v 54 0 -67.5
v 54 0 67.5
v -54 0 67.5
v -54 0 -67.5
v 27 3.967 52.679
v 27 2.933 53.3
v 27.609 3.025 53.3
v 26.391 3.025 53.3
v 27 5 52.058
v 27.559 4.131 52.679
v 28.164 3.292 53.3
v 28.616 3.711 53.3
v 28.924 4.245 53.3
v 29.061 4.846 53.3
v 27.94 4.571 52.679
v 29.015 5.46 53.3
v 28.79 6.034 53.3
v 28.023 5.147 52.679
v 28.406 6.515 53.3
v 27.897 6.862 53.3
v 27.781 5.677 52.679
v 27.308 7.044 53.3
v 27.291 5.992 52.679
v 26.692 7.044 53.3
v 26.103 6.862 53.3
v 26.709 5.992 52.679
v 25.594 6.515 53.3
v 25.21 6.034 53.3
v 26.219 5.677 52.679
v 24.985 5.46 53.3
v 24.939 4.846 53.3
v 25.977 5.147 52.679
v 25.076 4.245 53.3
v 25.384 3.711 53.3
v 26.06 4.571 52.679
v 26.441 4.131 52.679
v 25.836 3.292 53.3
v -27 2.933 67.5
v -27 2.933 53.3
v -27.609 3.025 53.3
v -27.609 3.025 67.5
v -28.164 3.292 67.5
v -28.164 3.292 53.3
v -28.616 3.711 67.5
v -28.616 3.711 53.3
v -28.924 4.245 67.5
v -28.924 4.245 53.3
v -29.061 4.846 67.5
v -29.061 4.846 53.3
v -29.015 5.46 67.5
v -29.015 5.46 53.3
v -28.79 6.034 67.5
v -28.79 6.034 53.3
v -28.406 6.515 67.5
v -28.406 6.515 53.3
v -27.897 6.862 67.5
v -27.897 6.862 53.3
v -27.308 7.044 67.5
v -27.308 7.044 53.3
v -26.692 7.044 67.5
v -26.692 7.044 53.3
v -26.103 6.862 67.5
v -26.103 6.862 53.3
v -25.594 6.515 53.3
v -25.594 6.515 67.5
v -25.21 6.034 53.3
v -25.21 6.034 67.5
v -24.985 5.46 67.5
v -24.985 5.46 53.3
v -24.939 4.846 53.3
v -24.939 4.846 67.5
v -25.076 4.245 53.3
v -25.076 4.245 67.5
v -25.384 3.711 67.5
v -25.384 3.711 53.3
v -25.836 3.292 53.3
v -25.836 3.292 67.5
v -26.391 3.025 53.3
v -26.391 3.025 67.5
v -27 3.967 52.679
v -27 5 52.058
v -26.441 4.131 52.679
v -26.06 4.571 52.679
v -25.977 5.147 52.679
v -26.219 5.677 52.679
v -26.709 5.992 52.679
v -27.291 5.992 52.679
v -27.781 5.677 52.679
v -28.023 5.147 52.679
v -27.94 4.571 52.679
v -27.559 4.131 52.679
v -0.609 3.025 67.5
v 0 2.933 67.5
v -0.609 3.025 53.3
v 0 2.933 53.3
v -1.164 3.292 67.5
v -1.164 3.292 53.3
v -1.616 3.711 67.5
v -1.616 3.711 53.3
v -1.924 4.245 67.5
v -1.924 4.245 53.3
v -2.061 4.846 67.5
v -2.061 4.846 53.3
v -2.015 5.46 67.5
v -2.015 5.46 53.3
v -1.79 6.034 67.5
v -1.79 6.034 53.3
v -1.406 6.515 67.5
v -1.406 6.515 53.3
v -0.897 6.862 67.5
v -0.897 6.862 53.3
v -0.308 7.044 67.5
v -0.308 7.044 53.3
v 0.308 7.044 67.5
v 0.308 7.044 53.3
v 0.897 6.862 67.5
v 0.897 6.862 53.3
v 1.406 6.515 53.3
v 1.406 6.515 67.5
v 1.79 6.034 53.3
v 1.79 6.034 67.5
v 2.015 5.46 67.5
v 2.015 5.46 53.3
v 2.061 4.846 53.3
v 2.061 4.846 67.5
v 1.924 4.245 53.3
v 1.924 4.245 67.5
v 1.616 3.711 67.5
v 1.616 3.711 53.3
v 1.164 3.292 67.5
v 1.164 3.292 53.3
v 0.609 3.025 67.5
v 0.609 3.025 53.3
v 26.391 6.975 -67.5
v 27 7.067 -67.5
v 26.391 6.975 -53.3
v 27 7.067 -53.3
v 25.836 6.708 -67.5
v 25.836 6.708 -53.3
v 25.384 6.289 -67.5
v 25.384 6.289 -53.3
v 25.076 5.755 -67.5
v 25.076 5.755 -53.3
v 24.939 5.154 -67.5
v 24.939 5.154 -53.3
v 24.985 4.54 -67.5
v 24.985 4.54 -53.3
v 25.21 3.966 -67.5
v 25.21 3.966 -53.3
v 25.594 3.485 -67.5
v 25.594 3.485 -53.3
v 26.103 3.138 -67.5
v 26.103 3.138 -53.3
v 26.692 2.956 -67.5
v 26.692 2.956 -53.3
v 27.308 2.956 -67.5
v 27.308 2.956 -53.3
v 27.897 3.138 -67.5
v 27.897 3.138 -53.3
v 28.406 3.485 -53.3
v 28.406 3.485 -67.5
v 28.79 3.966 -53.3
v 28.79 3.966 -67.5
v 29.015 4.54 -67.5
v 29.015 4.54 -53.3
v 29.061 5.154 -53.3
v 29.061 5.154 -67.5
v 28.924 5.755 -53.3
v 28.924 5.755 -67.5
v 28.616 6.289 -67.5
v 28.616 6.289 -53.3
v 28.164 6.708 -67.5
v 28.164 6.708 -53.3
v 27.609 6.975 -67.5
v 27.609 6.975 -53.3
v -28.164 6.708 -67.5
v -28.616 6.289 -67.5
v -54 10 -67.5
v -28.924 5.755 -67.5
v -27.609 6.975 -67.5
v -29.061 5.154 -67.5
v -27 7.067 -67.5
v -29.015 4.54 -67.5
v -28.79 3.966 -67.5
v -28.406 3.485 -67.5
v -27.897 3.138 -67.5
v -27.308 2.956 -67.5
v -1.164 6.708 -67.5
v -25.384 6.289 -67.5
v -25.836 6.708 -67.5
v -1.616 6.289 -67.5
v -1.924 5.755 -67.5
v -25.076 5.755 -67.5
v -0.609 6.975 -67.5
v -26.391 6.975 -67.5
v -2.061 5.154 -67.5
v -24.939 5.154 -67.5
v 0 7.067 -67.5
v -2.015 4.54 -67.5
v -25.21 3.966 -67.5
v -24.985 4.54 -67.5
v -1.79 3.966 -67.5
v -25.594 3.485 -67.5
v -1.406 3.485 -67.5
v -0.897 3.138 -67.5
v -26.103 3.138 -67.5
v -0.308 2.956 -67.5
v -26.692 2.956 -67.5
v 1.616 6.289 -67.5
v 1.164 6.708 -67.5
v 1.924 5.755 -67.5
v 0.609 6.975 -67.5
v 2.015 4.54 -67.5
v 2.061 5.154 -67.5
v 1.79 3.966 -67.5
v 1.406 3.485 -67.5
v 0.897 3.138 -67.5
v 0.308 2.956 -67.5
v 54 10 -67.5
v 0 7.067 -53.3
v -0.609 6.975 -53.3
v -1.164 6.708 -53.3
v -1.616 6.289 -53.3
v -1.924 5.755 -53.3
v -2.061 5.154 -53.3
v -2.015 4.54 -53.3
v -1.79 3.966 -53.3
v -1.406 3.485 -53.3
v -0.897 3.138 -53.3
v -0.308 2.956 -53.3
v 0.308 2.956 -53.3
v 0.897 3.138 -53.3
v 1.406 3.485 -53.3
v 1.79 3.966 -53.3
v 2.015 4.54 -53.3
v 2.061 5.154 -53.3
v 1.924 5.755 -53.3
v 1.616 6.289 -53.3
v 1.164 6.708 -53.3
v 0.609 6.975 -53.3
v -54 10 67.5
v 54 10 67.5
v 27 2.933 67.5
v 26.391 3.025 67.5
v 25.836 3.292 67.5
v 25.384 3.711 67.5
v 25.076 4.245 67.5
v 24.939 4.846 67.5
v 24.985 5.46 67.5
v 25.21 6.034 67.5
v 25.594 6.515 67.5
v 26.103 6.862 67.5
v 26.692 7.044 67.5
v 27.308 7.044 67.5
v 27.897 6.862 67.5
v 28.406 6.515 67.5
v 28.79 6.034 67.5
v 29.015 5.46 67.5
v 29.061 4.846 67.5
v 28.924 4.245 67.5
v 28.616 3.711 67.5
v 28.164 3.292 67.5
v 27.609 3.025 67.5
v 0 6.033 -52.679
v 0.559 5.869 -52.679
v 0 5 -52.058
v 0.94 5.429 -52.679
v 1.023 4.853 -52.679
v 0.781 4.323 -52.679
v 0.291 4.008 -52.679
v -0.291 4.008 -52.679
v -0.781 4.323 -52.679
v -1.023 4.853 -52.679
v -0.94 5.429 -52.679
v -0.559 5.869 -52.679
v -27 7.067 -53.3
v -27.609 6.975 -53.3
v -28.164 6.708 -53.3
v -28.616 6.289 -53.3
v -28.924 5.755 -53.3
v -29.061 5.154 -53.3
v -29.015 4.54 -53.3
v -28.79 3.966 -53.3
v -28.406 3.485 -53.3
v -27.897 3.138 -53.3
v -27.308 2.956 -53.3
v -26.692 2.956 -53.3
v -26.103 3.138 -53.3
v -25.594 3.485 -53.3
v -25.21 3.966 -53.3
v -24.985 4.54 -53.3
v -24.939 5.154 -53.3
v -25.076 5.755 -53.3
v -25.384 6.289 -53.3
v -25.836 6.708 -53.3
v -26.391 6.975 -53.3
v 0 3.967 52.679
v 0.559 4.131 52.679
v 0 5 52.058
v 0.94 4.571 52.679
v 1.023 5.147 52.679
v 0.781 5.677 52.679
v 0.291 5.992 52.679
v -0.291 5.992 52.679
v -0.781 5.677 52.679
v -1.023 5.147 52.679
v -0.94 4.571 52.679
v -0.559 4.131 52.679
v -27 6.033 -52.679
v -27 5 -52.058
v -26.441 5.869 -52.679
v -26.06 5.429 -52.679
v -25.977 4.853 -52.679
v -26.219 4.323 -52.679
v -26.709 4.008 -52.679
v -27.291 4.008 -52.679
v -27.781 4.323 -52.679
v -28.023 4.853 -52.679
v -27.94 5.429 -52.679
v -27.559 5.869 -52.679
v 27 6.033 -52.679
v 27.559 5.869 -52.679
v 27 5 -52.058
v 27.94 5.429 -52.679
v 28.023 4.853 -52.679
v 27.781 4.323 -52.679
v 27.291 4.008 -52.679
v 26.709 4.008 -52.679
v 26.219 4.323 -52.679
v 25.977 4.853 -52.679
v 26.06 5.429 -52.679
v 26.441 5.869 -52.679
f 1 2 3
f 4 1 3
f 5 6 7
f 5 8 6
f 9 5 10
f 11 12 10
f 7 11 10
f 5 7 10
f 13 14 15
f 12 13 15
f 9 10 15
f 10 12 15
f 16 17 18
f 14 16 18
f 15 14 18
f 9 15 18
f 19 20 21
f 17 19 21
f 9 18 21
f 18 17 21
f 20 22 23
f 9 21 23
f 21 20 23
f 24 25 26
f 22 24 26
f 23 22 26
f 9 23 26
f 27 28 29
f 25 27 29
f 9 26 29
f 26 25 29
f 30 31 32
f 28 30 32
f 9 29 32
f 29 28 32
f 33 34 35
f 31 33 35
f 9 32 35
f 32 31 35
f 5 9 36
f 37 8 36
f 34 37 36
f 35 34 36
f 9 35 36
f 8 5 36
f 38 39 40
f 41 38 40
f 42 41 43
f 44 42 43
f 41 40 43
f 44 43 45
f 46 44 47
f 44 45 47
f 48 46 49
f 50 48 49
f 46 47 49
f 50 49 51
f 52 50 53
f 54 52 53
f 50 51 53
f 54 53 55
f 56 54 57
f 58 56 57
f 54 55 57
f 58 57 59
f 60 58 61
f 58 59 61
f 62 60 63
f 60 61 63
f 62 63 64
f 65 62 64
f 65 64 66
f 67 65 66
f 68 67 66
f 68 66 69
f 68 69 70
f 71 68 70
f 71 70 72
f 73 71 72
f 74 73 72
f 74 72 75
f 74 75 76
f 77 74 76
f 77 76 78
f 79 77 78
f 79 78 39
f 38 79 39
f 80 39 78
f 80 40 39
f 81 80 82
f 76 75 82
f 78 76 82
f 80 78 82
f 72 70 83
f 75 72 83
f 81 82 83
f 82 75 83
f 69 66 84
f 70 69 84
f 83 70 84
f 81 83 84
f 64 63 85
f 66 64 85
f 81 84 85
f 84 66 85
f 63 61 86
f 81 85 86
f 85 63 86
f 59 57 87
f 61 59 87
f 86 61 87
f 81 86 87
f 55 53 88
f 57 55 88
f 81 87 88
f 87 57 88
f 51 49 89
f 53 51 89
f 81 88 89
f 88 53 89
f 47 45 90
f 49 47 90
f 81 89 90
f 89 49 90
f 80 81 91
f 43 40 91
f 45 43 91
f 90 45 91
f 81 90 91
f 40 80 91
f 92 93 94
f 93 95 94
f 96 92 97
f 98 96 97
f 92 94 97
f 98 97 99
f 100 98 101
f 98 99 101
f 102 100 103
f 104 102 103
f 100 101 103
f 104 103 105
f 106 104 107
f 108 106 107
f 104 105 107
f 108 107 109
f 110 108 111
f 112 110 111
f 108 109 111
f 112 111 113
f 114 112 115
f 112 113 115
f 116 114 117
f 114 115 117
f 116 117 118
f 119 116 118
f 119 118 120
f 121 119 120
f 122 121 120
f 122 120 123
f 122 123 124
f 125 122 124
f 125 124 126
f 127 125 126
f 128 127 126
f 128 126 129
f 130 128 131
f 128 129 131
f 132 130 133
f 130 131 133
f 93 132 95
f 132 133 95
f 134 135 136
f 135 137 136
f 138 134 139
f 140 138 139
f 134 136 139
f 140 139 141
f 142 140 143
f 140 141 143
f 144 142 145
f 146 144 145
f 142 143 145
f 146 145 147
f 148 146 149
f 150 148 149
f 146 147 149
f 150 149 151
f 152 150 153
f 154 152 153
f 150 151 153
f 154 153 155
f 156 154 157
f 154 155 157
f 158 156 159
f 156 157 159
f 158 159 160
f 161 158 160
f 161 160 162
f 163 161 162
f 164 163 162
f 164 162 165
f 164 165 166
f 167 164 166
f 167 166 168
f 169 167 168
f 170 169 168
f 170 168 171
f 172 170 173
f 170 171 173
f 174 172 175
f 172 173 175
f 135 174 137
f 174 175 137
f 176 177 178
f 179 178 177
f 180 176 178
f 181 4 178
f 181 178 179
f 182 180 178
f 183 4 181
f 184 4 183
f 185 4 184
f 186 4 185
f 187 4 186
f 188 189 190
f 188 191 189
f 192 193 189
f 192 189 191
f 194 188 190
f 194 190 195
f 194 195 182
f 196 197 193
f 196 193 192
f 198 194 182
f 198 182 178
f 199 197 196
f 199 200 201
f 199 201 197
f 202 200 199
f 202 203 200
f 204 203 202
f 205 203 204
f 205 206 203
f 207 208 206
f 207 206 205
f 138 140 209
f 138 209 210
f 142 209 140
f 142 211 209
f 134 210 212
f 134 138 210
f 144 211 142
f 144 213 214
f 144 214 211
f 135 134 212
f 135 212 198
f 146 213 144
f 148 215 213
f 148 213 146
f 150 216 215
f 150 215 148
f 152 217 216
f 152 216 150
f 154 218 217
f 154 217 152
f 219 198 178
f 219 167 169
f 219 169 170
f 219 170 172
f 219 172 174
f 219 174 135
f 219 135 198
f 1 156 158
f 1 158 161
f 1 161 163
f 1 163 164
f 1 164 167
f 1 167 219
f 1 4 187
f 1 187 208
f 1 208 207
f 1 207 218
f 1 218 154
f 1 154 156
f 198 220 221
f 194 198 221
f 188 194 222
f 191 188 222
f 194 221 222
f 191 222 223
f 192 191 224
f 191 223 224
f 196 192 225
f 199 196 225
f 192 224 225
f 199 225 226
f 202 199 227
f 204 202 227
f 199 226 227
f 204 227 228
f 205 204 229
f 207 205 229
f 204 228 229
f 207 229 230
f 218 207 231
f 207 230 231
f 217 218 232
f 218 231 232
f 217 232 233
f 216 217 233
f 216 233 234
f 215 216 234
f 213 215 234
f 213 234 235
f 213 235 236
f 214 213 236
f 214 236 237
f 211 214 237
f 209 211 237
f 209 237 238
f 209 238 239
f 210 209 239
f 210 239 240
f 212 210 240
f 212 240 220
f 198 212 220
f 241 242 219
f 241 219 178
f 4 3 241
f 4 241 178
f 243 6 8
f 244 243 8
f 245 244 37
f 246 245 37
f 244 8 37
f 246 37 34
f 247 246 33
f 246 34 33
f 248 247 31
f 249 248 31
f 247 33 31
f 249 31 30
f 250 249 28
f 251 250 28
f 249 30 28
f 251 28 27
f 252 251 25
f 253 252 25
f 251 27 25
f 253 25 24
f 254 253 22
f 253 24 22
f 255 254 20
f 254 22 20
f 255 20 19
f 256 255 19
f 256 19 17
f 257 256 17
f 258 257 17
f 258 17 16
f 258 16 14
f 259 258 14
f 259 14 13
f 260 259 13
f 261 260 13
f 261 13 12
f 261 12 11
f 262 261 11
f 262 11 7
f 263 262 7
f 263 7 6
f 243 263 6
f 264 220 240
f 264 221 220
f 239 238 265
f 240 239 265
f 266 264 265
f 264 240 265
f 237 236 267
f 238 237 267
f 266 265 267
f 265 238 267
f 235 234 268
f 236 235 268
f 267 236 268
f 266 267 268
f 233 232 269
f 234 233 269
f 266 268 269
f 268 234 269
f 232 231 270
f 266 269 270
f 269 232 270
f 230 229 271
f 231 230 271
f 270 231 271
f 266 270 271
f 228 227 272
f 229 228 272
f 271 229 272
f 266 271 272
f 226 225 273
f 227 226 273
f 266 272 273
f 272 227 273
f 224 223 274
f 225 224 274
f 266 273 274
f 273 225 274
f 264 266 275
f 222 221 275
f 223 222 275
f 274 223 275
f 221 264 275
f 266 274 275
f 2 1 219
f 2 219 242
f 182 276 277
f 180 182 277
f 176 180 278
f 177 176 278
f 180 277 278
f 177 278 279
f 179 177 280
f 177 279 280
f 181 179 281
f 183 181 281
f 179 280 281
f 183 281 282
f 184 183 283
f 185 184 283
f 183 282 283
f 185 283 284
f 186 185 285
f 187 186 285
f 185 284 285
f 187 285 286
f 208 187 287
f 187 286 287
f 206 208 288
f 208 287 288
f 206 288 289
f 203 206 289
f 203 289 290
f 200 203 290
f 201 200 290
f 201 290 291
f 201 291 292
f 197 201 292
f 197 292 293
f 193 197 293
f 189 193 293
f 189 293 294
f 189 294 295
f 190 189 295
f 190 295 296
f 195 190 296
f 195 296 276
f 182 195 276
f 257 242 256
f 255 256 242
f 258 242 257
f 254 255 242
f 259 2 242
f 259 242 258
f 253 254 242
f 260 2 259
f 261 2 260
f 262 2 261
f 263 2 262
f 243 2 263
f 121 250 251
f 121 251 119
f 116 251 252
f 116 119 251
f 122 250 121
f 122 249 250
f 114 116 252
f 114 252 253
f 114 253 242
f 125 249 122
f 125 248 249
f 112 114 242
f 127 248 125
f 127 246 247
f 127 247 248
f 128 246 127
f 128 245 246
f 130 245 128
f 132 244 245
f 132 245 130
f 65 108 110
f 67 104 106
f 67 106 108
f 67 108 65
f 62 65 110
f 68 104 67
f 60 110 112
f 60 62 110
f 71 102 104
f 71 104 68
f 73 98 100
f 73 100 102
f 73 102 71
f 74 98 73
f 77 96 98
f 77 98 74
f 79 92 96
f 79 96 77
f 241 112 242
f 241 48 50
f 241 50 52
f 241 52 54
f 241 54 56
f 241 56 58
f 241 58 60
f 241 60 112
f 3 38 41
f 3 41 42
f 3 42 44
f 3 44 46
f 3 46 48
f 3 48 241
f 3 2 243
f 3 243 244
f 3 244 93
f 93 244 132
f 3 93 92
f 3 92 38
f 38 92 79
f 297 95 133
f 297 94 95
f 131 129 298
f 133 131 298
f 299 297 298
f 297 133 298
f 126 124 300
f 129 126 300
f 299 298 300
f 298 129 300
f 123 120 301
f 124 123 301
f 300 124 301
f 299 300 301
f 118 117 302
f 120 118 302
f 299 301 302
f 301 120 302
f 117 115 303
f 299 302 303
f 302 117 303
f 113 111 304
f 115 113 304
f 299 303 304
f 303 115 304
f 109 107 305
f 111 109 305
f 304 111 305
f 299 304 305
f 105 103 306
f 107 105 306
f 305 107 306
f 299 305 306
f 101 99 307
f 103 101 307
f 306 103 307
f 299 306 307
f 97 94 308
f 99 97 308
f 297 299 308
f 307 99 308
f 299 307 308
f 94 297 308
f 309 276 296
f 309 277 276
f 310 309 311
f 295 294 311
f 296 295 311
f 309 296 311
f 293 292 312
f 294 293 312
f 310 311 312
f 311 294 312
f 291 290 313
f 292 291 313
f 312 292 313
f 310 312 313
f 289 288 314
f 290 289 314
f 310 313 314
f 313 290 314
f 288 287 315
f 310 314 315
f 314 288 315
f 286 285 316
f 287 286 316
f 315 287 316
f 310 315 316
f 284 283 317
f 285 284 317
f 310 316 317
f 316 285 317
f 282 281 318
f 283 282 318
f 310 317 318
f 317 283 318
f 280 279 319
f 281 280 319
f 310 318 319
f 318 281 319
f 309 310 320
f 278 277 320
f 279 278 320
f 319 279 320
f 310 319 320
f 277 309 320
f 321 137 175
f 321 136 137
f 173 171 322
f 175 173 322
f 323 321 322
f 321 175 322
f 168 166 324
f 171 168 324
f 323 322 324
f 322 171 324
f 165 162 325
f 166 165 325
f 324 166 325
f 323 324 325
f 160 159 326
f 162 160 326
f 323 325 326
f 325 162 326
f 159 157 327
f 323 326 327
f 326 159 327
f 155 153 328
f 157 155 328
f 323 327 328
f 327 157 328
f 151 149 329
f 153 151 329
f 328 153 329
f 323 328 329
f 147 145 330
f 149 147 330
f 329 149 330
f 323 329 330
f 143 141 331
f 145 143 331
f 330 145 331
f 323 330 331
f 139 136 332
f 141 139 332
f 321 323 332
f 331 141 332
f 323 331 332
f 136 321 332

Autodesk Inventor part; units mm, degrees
ref_plane "YZ Plane" through (0, 0, 0) normal (1, 0, 0) x (0, 1, 0)
ref_plane "XZ Plane" through (0, 0, 0) normal (0, 1, 0) x (-1, 0, 0)
ref_plane "XY Plane" through (0, 0, 0) normal (0, 0, 1) x (1, 0, 0)
sketch "Sketch1" plane through (0, 0, 0) normal (0, 1, 0) x (-1, 0, 0)
  line L0 (54, -67.5) -> (-54, -67.5)
  line L1 (-54, -67.5) -> (-54, 67.5)
  line L2 (-54, 67.5) -> (54, 67.5)
  line L3 (54, 67.5) -> (54, -67.5)
  line L4 (0, -94.5) -> (0, 94.5) construction
  line L5 (-75.6, 0) -> (75.6, 0) construction
  point P0 (0, 0)
  dimension "d0" = 108
  dimension "d1" = 135
extrude "Extrusion1" add sketch "Sketch1" along normal blind 10
sketch "Sketch2" plane through (-54, 0, 67.5) normal (0, 0, 1) x (1, 0, 0)
  line L0 (108, 10) -> (0, 10) projected
  line L1 (54, 10) -> (54, 0) construction
  line L2 (3.9342, 5) -> (111.9342, 5) construction
  point P0 (54, 5)
  point P1 (81, 5)
  point P2 (27, 5)
  dimension "d4" = 54
hole "Hole1" at (0, 5, 67.5) at (27, 5, 67.5) at (-27, 5, 67.5) direction (0, 0, -1) diameter 4.134 depth 14.2 tip angle 118 thread size "M5x0.8" class "6H" standard "ISO Metric profile"
sketch "Sketch3" plane through (54, 0, -67.5) normal (0, 0, -1) x (-1, 0, 0)
  point P0 (54, 0)
  point P1 (27, 5)
  point P2 (54, 5)
  point P3 (81, 5)
hole "Hole2" at (27, 5, -67.5) at (0, 5, -67.5) at (-27, 5, -67.5) direction (0, 0, 1) diameter 4.134 depth 14.2 tip angle 118 thread size "M5x0.8" class "6H" standard "ISO Metric profile"
properties part number "motor_base_plate" material "Aluminum 6061"
